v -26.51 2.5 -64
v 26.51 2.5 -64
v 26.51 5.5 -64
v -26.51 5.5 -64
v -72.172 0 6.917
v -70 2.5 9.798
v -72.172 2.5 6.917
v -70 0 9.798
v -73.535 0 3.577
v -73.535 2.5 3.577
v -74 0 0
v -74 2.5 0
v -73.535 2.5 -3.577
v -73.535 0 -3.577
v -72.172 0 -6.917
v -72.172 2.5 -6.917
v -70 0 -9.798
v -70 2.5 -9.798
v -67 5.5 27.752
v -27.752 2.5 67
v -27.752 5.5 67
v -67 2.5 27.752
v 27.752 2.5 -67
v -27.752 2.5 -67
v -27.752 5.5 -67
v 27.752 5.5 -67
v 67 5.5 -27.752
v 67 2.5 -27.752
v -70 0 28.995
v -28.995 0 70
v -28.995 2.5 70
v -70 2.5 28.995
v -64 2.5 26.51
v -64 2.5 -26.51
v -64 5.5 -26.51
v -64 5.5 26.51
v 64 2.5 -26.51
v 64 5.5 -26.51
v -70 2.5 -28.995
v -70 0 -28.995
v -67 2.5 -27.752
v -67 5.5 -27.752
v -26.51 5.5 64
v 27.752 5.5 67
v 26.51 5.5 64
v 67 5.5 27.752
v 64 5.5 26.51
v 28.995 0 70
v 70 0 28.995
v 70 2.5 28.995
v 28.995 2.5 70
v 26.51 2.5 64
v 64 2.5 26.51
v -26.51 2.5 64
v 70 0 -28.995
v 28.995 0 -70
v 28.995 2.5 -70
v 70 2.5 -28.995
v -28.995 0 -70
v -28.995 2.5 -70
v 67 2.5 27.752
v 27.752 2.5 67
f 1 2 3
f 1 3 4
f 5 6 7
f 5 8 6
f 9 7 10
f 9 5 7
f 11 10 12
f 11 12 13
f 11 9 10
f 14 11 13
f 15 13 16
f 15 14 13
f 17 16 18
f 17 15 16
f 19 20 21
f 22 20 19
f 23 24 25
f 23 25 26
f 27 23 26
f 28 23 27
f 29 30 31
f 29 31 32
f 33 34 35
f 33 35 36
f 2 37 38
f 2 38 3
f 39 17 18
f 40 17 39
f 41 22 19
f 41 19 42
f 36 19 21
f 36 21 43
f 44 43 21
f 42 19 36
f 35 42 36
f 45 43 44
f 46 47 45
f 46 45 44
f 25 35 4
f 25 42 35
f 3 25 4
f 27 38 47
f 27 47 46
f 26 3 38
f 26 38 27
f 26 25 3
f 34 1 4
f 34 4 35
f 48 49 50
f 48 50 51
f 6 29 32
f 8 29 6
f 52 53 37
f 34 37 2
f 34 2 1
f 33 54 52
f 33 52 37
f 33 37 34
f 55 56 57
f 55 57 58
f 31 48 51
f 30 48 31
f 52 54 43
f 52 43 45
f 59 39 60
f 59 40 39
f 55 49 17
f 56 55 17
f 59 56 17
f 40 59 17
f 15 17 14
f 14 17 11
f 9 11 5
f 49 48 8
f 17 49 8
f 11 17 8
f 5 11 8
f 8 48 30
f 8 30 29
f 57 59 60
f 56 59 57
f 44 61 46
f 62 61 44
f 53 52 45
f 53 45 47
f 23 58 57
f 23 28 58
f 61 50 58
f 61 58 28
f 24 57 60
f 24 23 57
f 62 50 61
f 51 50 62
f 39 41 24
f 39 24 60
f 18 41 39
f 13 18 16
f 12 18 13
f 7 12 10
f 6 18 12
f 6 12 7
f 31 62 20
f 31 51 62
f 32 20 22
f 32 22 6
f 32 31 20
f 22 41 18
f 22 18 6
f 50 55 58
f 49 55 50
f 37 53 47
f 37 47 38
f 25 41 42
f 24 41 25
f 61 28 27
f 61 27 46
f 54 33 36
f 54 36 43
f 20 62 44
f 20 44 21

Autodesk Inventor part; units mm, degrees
ref_plane "YZ Plane" through (0, 0, 0) normal (1, 0, 0) x (0, 1, 0)
ref_plane "XZ Plane" through (0, 0, 0) normal (0, 1, 0) x (-1, 0, 0)
ref_plane "XY Plane" through (0, 0, 0) normal (0, 0, 1) x (1, 0, 0)
sketch "Skizze4" plane through (0, 0, 0) normal (0, 1, 0) x (-1, 0, 0)
  line L0 (28.9949, 70) -> (70, 28.9949)
  line L1 (70, 28.9949) -> (70, -28.9949)
  line L2 (70, -28.9949) -> (28.9949, -70)
  line L3 (28.9949, -70) -> (-28.9949, -70)
  line L4 (-28.9949, -70) -> (-70, -28.9949)
  line L5 (-70, -28.9949) -> (-70, 28.9949)
  line L6 (-70, 28.9949) -> (-28.9949, 70)
  line L7 (-28.9949, 70) -> (28.9949, 70)
  line L8 (0, -98) -> (0, 98) construction
  line L9 (98, 0) -> (-98, 0) construction
  point P0 (0, 0)
  point P1 (0, 0)
  dimension "d4" = 140
extrude "Extrusion2" add sketch "Skizze4" along normal blind 2.5
sketch "Skizze9" plane through (0, 2.5, 0) normal (0, 1, 0) x (1, 0, 0)
  line L0 (-70, -28.9949) -> (-28.9949, -70) construction
  line L1 (-28.9949, -70) -> (28.9949, -70) construction
  line L2 (28.9949, -70) -> (70, -28.9949) construction
  line L3 (70, -28.9949) -> (70, 28.9949) construction
  line L4 (70, 28.9949) -> (28.9949, 70) construction
  line L5 (28.9949, 70) -> (-28.9949, 70) construction
  line L6 (-28.9949, 70) -> (-70, 28.9949) construction
  line L7 (-70, 28.9949) -> (-70, -28.9949) construction
  line L8 (-27.7523, -67) -> (-67, -27.7523)
  line L9 (-67, -27.7523) -> (-67, 27.7523)
  line L10 (-67, 27.7523) -> (-27.7523, 67)
  line L11 (-27.7523, 67) -> (27.7523, 67)
  line L12 (27.7523, 67) -> (67, 27.7523)
  line L13 (67, 27.7523) -> (67, -27.7523)
  line L14 (67, -27.7523) -> (27.7523, -67)
  line L15 (27.7523, -67) -> (-27.7523, -67)
  line L16 (-64, -26.5097) -> (-26.5097, -64)
  line L17 (-26.5097, -64) -> (26.5097, -64)
  line L18 (26.5097, -64) -> (64, -26.5097)
  line L19 (64, -26.5097) -> (64, 26.5097)
  line L20 (64, 26.5097) -> (26.5097, 64)
  line L21 (26.5097, 64) -> (-26.5097, 64)
  line L22 (-26.5097, 64) -> (-64, 26.5097)
  line L23 (-64, 26.5097) -> (-64, -26.5097)
  point P0 (0, 0)
  dimension "d20" = 3
  dimension "d21" = 3
extrude "Extrusion6" add sketch "Skizze9" along normal blind 3
sketch "Skizze7" plane through (0, 0, 0) normal (0, -1, 0) x (1, 0, 0)
  line L0 (-28.9949, 70) -> (-70, 28.9949) construction
  line L1 (-70, 28.9949) -> (-70, -28.9949) construction
  line L2 (-70, -28.9949) -> (-28.9949, -70) construction
  line L3 (-28.9949, -70) -> (28.9949, -70) construction
  line L4 (28.9949, -70) -> (70, -28.9949) construction
  line L5 (70, -28.9949) -> (70, 28.9949) construction
  line L6 (70, 28.9949) -> (28.9949, 70) construction
  line L7 (28.9949, 70) -> (-28.9949, 70) construction
  line L8 (-70, 28.9949) -> (-70, -28.9949) projected
  arc A0 (-70, 9.798) -> (-70, -9.798) centre (-60, 0) ccw
  line L9 (-87.767, 0) -> (-49.4975, 0) construction
  line L10 (-78.3477, 9.798) -> (-61.6523, 9.798) construction
  line L11 (-77.7764, -9.798) -> (-65.8218, -9.798) construction
  line L12 (-119.3204, 0) -> (101.5534, 0) construction
  point P0 (0, 0)
  dimension "d15" = 14
  dimension "d16" = 10
extrude "Extrusion5" add sketch "Skizze7" against normal up to surface (2.5 mm away)
properties part number "Oktagon_Deckel" material "Kst - PC/Makrolon (clear)"
